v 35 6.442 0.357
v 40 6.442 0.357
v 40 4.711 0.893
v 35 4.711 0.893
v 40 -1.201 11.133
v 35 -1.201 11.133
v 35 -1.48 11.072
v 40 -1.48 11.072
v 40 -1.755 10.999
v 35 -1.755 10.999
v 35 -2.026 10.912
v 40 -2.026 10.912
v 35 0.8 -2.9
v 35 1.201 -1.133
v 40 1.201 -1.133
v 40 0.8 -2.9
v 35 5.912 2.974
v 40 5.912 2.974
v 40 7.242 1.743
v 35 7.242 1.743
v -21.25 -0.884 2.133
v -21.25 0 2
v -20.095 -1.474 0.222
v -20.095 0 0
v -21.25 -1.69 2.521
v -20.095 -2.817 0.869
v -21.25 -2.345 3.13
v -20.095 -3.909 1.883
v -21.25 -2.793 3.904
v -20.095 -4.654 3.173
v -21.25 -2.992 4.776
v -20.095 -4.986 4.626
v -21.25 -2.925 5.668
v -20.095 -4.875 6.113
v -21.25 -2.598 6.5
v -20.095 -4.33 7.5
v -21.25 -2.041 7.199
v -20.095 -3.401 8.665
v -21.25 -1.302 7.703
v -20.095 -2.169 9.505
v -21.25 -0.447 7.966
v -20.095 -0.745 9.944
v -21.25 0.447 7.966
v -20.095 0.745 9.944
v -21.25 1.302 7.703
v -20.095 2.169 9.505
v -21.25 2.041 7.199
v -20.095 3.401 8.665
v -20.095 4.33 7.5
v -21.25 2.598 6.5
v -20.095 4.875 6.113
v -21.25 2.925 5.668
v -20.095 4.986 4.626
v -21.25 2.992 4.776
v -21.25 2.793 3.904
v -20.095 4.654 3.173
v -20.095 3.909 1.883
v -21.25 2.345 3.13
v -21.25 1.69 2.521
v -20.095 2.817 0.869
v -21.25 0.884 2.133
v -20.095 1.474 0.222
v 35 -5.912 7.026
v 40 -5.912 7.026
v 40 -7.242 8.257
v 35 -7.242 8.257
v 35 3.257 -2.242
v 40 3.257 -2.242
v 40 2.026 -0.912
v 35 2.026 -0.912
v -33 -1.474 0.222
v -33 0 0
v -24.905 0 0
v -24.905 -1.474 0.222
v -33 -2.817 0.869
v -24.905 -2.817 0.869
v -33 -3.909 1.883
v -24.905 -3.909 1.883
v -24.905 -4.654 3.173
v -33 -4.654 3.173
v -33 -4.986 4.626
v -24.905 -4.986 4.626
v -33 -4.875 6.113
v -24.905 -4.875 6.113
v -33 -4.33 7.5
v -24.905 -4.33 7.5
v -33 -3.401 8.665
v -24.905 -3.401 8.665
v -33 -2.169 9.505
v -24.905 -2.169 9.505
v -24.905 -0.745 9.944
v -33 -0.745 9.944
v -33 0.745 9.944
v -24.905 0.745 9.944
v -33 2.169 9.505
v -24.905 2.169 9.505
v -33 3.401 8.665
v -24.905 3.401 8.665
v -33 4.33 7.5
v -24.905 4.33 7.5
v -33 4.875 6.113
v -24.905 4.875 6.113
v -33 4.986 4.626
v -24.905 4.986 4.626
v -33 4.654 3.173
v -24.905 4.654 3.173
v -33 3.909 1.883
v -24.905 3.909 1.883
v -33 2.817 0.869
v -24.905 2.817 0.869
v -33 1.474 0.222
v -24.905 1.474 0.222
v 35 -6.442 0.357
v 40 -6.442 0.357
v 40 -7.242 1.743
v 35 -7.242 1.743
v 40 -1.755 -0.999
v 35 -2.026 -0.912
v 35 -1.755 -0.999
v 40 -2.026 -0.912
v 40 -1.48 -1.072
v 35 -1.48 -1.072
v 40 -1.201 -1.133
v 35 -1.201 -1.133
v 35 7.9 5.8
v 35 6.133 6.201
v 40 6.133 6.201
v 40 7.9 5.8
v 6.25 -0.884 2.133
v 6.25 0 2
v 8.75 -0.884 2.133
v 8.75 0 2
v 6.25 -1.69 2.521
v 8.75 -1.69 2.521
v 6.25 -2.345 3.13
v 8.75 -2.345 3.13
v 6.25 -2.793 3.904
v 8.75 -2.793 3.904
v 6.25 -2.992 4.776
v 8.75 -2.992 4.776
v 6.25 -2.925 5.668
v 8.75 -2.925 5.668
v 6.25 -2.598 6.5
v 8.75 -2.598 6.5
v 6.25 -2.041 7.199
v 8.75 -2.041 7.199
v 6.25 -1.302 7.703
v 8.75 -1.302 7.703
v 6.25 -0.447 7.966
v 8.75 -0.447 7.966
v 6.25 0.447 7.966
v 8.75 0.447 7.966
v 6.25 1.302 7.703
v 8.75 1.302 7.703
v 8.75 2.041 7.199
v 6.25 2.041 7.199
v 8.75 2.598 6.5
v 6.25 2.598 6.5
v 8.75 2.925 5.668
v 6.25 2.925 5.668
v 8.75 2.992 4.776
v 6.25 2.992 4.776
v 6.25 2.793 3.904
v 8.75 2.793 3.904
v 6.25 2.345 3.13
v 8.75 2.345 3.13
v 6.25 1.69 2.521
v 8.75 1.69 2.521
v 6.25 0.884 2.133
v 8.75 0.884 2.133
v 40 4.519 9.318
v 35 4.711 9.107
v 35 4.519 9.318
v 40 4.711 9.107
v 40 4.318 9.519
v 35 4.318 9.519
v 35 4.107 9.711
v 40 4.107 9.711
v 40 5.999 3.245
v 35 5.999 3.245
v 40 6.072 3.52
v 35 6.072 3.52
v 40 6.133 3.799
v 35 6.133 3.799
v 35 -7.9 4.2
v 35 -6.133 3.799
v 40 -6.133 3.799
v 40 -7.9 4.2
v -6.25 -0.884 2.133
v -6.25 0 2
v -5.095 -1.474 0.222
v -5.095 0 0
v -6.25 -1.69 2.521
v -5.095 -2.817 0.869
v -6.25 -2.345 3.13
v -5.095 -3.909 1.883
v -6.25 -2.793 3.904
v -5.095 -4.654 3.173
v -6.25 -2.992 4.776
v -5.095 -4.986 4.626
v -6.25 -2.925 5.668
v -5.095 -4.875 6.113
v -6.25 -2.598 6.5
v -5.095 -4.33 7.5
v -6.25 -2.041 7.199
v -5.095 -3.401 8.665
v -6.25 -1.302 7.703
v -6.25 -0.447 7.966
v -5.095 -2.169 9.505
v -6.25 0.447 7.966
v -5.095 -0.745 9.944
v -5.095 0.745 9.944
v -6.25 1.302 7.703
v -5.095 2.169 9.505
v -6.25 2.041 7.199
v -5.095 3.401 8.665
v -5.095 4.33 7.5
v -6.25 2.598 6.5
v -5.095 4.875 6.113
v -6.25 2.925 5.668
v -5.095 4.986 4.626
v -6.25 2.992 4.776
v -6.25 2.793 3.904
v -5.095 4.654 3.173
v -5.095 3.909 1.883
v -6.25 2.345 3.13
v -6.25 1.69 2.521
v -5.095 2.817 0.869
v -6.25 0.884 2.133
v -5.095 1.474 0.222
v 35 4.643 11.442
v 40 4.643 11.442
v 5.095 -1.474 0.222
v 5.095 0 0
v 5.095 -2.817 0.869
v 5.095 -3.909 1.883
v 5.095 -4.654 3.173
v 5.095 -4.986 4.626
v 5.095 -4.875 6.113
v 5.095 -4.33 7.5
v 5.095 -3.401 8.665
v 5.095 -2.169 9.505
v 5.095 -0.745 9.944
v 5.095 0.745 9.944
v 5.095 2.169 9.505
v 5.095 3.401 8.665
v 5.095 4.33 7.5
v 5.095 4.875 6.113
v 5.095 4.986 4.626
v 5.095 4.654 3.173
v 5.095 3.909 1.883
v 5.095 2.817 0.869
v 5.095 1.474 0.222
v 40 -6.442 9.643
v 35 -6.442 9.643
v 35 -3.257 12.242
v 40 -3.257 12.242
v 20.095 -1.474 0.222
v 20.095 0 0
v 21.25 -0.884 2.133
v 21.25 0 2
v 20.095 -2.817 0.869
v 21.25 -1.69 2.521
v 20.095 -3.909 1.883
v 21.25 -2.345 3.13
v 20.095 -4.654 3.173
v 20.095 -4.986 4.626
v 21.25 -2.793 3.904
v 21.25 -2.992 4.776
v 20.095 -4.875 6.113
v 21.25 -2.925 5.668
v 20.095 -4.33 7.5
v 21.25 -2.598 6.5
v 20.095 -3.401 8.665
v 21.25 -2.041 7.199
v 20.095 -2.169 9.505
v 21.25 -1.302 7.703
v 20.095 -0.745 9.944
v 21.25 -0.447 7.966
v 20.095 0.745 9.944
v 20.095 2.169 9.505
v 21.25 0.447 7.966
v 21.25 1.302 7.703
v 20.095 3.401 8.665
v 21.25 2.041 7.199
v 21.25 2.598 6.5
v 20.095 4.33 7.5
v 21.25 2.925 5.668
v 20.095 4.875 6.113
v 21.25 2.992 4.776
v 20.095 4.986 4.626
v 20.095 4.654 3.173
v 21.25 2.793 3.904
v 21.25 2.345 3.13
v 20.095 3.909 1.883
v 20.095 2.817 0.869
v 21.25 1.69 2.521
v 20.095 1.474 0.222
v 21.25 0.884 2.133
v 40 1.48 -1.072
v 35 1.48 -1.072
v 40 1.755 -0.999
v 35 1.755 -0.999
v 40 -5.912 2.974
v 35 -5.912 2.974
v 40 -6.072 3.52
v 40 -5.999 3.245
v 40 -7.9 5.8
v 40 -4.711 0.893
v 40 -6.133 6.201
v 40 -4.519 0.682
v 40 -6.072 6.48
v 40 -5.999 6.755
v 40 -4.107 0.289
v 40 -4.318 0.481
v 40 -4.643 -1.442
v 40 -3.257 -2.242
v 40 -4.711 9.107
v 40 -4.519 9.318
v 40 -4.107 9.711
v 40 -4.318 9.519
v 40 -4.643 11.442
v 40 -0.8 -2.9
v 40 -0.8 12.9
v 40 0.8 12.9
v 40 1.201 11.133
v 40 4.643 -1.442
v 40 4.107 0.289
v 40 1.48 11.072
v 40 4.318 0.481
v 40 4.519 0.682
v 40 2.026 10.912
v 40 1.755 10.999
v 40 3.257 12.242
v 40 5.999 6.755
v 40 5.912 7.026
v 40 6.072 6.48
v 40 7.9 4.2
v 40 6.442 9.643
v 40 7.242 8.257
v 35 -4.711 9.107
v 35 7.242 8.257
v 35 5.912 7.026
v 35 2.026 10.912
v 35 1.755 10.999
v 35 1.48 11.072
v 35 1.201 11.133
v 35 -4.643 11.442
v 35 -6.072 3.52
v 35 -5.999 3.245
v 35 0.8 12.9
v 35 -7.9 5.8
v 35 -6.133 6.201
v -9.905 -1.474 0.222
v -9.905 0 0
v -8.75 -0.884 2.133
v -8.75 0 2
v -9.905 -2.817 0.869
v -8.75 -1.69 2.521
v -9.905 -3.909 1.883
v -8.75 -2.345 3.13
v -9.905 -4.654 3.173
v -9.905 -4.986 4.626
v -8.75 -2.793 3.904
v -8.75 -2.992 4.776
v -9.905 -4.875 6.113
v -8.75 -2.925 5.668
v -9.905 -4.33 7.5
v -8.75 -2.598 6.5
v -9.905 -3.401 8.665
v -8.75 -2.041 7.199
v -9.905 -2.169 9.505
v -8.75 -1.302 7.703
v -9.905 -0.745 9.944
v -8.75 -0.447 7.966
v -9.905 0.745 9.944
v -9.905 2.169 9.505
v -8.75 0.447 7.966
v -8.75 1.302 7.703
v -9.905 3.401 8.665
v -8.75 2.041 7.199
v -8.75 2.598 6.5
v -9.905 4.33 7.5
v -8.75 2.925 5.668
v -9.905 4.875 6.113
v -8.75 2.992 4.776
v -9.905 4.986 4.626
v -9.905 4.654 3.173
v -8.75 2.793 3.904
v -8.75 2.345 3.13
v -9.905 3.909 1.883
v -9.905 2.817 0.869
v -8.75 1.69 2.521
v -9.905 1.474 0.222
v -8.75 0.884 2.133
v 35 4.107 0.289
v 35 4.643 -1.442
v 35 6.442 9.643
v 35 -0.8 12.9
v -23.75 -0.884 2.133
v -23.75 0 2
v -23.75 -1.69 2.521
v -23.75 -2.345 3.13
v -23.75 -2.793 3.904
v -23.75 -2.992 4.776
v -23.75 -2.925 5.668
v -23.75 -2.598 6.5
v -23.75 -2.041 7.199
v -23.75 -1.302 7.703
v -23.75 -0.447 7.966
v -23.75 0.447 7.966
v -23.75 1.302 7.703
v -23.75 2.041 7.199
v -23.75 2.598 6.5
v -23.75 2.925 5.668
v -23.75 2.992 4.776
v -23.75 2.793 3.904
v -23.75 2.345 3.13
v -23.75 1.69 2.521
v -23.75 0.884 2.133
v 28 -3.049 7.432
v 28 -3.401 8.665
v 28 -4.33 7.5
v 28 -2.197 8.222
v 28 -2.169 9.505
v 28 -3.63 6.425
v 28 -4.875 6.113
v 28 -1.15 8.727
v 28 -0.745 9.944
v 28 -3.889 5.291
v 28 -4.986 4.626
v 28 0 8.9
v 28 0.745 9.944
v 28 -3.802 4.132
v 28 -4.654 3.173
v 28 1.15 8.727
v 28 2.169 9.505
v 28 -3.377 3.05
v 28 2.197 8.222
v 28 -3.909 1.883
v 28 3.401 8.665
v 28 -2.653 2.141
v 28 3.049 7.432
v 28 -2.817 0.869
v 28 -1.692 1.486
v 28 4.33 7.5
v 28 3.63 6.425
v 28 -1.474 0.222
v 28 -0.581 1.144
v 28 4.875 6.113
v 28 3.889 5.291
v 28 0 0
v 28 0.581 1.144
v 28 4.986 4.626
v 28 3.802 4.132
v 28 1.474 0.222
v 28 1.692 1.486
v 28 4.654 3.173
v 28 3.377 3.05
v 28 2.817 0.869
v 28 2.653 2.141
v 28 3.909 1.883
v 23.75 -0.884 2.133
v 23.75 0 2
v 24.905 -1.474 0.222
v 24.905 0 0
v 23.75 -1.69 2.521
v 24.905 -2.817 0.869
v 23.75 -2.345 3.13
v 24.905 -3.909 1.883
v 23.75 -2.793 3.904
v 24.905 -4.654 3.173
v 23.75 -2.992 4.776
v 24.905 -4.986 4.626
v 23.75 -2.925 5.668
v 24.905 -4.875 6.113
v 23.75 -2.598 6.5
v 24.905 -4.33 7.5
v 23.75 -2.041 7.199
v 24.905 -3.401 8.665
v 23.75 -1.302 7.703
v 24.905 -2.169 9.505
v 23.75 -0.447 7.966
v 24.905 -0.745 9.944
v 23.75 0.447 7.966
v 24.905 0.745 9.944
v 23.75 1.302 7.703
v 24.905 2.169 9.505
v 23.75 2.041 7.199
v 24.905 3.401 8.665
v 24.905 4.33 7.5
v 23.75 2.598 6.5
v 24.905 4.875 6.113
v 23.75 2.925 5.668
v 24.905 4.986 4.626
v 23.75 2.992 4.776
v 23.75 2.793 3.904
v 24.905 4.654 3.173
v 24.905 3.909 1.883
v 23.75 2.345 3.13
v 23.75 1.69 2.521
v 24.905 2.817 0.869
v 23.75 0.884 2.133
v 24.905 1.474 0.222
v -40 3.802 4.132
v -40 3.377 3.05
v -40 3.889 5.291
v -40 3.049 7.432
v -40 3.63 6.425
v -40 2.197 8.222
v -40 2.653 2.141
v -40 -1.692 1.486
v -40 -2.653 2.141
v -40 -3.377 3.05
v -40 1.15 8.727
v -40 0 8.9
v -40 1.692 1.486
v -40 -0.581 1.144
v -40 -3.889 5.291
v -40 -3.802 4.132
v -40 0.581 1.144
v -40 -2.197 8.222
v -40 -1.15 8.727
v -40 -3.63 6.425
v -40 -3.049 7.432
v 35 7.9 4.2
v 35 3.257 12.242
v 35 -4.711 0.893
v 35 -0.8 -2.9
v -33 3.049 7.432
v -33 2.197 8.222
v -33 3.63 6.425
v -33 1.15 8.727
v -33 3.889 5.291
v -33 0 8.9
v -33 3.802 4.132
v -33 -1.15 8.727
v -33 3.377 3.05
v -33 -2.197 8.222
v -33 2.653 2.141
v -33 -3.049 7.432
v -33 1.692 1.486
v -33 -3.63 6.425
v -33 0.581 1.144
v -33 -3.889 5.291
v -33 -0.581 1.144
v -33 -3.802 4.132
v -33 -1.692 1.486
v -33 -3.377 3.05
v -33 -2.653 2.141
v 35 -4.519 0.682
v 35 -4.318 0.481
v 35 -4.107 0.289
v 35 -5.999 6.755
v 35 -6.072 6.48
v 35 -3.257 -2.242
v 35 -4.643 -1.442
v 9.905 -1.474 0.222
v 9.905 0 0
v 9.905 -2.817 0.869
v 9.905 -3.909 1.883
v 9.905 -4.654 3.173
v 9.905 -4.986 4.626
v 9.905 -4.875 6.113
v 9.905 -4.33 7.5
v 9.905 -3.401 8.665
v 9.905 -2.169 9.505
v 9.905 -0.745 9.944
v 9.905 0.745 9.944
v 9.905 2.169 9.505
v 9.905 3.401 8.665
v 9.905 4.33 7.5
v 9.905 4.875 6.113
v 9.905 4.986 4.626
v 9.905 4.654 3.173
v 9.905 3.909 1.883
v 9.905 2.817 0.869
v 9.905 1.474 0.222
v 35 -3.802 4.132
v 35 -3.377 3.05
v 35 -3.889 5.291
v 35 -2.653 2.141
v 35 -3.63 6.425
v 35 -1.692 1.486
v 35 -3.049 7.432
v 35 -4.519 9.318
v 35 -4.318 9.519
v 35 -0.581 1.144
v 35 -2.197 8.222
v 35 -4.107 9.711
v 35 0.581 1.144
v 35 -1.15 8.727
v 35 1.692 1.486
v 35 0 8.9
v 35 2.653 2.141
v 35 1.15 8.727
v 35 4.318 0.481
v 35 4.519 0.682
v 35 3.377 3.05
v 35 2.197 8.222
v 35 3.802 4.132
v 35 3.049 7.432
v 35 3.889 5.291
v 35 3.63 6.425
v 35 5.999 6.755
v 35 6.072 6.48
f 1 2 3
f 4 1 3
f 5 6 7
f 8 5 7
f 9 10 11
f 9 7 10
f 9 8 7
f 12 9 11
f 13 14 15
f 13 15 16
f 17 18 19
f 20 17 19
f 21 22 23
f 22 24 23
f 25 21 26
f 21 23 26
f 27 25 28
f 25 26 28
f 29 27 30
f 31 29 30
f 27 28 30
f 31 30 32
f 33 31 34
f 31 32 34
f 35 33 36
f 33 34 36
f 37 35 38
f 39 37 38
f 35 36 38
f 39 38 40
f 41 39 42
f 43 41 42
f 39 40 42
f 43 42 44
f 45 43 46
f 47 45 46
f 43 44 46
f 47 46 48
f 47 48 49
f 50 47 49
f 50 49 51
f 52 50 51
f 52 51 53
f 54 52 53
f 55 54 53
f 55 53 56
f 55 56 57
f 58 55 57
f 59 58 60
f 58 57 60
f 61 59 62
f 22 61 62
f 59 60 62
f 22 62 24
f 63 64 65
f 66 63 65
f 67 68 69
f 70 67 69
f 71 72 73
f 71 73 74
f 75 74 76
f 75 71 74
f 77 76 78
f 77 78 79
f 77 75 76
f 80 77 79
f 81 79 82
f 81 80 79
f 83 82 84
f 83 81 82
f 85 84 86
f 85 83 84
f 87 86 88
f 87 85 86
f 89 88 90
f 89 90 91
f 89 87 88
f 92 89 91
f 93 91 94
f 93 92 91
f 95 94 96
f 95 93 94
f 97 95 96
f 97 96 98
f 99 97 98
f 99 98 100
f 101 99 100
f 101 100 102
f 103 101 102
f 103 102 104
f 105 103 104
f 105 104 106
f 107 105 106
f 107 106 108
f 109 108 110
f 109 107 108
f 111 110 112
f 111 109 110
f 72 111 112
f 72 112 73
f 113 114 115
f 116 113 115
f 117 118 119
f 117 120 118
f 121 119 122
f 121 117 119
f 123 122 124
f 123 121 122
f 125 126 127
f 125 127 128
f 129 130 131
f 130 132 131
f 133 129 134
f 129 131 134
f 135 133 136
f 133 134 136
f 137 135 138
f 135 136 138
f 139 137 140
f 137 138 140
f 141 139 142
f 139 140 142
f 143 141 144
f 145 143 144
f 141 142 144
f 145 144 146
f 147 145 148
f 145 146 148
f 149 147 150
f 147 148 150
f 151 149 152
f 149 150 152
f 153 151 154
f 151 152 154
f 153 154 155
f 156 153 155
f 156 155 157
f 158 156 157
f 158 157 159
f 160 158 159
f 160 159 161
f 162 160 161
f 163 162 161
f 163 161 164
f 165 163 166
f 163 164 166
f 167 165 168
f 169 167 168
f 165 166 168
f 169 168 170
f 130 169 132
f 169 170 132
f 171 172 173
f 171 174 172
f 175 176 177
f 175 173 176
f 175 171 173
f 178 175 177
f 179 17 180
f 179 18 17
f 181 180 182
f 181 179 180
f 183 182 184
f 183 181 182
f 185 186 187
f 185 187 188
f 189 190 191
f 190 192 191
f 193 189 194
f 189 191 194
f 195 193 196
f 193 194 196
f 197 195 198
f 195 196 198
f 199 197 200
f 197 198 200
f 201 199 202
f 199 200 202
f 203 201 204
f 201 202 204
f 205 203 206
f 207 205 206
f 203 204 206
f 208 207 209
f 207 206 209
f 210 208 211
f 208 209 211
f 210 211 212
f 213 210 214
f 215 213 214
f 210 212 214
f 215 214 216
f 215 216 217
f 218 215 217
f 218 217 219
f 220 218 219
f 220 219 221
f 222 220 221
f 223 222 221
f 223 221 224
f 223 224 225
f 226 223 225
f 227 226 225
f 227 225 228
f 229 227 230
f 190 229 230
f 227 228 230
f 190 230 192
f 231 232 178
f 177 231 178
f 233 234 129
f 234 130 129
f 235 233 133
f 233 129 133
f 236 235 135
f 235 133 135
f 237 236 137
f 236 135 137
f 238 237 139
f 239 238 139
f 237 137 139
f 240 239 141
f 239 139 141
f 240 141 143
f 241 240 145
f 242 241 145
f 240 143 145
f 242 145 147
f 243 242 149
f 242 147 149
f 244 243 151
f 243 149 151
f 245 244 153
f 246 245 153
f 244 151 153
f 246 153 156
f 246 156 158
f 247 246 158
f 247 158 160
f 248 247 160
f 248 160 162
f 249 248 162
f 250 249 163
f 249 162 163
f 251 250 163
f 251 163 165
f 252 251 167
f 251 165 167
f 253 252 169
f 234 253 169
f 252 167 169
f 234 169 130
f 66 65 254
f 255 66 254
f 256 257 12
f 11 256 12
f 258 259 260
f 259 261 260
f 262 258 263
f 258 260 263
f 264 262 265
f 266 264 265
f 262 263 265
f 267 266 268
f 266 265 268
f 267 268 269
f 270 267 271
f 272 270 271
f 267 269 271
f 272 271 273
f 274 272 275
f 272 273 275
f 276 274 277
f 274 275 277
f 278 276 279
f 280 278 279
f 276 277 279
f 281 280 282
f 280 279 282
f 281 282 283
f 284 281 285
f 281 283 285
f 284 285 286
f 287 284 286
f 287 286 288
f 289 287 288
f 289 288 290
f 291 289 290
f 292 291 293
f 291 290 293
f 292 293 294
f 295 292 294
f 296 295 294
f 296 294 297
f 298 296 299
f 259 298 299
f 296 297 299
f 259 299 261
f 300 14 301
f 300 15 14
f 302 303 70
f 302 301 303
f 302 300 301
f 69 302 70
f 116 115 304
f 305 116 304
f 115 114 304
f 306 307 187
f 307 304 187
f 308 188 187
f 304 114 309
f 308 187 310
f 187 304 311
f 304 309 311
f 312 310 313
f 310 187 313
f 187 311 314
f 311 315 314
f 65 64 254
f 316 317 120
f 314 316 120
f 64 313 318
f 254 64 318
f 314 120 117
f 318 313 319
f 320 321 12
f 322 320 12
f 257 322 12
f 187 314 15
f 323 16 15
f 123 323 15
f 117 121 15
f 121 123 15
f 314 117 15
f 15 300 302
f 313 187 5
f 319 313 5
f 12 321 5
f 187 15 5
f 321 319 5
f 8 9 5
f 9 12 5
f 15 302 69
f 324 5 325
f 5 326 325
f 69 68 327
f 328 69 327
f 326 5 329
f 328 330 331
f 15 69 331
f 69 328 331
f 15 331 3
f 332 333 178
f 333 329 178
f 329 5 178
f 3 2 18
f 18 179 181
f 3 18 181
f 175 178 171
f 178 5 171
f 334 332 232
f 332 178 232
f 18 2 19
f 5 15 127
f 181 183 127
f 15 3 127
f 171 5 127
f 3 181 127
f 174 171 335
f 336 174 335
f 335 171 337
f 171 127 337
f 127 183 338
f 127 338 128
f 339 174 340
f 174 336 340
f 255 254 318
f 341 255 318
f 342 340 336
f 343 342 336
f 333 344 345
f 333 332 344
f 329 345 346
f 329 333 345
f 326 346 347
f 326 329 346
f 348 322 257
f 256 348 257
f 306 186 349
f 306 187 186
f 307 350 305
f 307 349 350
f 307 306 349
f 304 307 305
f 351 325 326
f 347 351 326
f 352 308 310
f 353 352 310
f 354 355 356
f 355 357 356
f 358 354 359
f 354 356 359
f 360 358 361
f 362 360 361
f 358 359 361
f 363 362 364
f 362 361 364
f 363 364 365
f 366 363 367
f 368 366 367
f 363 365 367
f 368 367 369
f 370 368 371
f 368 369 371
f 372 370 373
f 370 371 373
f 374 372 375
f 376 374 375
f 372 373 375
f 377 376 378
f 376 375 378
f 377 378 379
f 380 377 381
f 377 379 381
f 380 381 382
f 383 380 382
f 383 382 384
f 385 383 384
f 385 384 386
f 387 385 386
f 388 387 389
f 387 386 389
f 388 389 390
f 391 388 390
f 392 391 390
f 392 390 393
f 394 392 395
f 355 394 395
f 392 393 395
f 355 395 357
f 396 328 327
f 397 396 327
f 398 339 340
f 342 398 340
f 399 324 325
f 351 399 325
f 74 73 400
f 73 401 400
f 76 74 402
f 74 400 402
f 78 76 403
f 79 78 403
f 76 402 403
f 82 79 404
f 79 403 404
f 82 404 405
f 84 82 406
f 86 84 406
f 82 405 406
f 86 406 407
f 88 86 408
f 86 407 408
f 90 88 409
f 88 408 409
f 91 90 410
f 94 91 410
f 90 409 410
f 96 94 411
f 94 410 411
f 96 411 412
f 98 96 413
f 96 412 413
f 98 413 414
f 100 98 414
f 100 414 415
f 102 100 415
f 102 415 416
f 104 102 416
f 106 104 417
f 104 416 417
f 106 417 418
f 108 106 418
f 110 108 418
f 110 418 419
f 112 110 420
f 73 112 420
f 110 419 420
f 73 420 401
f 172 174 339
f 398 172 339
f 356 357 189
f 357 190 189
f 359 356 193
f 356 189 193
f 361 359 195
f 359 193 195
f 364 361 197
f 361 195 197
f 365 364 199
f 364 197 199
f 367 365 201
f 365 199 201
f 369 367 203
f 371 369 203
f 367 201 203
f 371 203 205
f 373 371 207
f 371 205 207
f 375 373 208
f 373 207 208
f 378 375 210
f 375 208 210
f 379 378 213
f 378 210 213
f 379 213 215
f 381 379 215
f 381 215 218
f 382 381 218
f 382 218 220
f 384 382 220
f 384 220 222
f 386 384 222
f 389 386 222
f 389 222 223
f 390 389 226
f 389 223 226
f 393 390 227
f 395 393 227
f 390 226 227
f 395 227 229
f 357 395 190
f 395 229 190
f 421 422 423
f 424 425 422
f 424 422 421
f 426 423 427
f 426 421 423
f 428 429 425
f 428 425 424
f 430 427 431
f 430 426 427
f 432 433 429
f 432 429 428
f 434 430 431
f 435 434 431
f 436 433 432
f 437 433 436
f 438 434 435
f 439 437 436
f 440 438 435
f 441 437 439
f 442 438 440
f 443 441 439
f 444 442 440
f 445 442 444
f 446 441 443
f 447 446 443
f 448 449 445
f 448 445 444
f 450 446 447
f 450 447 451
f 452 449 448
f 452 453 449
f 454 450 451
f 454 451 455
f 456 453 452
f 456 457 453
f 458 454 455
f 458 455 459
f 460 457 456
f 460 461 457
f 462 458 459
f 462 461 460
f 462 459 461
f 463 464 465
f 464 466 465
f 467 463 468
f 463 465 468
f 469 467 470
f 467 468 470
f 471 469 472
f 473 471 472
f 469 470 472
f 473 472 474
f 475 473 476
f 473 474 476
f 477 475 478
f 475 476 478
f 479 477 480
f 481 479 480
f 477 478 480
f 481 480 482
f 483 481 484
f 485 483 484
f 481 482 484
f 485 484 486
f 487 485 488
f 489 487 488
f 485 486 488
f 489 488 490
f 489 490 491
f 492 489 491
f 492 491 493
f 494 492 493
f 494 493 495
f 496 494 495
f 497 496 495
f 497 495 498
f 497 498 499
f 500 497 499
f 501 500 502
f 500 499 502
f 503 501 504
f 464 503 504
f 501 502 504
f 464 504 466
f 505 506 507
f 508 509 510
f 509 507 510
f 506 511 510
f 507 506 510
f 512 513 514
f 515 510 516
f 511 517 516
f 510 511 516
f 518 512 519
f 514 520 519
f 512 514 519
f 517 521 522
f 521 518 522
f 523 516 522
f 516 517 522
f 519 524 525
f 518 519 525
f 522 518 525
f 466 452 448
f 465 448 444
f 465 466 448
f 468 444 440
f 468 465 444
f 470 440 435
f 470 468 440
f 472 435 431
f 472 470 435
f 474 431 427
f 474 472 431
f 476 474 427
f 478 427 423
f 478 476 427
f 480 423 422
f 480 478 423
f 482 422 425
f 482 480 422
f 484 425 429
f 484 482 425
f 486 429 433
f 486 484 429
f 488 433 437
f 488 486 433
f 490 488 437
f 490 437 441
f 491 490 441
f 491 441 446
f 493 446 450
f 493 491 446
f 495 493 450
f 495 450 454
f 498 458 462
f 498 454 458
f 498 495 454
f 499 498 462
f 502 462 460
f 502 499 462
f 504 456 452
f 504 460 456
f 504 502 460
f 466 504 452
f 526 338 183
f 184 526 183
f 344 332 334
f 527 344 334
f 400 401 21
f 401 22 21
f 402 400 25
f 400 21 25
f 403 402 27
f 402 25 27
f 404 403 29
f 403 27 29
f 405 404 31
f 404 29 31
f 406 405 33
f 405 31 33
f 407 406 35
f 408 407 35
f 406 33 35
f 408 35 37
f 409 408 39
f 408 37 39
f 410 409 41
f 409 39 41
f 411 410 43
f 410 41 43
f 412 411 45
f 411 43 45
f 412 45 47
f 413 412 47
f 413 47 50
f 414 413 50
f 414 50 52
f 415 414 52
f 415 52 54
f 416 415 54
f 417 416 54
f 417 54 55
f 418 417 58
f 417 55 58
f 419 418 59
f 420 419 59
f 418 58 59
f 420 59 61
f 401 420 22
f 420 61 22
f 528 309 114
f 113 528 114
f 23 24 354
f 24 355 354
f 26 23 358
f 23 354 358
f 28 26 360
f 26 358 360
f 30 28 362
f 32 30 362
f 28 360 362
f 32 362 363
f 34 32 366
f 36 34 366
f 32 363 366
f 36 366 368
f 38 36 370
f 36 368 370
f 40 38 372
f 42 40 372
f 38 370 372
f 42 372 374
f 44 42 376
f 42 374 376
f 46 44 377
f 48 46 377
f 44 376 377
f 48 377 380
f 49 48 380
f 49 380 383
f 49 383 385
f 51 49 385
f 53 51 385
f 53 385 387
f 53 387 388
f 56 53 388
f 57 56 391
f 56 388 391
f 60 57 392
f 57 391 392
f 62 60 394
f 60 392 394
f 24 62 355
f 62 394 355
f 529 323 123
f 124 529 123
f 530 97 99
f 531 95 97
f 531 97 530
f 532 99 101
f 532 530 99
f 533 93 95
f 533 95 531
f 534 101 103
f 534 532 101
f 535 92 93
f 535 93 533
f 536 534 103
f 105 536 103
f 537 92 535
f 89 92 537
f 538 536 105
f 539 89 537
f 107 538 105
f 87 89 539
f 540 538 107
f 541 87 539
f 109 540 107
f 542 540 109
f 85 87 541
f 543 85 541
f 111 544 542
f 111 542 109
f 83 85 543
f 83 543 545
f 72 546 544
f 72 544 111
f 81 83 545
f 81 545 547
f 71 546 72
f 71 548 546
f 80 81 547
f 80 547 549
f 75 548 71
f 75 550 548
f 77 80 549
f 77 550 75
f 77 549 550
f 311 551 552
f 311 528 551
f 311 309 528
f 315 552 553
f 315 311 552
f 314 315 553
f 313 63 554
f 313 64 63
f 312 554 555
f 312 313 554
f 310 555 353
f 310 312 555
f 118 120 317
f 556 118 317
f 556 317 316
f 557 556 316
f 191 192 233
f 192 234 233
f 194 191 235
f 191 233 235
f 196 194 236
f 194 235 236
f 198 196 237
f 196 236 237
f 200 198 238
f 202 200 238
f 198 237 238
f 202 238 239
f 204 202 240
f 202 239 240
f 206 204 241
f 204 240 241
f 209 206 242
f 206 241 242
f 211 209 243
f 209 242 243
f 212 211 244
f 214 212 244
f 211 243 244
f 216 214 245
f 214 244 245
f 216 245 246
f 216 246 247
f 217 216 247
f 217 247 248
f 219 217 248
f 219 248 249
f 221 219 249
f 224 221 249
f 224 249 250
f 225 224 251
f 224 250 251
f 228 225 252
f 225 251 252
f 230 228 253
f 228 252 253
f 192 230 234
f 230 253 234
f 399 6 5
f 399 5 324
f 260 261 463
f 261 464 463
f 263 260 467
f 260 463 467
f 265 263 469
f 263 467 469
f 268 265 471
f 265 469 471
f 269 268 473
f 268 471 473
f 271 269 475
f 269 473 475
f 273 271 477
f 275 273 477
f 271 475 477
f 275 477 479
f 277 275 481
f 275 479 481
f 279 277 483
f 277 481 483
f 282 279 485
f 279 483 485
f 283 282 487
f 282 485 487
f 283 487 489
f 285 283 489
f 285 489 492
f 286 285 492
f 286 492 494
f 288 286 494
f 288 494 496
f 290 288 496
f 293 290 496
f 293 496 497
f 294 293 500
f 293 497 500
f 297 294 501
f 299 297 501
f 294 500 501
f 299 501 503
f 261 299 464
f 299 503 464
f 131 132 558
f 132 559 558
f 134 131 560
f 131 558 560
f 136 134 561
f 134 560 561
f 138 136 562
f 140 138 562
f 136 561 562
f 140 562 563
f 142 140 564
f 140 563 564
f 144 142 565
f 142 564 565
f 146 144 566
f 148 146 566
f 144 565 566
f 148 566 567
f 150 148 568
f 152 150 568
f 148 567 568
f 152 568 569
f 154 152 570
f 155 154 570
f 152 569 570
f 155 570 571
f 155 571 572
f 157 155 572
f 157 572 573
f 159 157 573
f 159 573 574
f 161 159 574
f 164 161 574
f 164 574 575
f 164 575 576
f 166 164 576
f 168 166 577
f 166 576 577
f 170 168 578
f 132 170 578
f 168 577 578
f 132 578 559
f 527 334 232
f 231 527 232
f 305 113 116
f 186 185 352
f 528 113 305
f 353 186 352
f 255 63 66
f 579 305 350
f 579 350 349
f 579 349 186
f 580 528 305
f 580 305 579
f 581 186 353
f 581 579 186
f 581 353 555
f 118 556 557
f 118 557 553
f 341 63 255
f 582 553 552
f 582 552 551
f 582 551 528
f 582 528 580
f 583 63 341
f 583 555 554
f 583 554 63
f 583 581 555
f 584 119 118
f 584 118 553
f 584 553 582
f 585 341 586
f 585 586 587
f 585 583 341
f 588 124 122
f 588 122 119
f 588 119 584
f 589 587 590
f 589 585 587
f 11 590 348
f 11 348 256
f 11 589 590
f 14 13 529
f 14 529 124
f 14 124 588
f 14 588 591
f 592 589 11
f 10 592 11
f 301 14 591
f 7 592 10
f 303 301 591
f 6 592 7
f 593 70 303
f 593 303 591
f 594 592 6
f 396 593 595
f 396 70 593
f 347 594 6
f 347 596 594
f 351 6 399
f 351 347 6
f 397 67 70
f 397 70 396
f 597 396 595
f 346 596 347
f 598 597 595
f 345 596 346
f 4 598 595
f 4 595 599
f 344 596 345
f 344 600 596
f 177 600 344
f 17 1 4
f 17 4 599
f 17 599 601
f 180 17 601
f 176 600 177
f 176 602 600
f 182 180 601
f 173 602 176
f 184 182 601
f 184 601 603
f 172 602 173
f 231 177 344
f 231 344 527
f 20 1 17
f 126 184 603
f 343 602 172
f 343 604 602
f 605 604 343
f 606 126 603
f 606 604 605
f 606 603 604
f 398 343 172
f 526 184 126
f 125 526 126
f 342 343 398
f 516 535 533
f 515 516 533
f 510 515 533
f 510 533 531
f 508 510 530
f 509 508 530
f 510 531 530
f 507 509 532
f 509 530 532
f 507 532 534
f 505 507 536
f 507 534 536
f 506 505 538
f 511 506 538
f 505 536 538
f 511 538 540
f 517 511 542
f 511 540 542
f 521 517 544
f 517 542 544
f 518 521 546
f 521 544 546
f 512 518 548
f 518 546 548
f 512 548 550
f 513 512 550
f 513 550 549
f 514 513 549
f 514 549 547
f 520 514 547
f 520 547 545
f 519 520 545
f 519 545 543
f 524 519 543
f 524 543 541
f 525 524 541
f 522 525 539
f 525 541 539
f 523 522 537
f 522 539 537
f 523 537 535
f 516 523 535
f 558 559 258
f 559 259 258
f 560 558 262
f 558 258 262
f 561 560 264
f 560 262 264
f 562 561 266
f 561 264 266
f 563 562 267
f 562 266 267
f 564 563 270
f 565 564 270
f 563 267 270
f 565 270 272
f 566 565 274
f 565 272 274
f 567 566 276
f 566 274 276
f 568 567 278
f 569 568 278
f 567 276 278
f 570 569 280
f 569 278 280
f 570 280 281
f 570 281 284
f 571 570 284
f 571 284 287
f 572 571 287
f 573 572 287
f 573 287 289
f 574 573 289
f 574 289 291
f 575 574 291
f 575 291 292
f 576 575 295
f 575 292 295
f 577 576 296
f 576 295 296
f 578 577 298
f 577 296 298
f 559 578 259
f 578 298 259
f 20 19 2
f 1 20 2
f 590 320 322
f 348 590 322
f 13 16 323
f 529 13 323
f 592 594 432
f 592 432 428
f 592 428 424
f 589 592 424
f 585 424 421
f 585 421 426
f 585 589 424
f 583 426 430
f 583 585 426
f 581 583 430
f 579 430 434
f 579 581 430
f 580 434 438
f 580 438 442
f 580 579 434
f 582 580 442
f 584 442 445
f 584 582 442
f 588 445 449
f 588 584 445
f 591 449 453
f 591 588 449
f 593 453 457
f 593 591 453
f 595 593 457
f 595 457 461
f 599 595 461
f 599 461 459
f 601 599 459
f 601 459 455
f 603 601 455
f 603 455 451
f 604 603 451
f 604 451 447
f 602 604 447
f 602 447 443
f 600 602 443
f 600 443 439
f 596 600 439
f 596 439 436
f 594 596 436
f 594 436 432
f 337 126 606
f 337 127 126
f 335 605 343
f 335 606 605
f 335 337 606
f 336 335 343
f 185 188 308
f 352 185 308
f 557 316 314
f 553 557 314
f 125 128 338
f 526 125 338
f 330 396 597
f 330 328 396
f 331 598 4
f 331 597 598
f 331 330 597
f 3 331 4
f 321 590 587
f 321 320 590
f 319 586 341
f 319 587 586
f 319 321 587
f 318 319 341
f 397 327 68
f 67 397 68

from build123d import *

# Parameters (mm, degrees)
CUT_EXTRUDE2_START  = -7
SKETCH4_R           = 5
SKETCH4_R_2         = 3.9
CUT_EXTRUDE2_DEPTH  = 7
SKETCH3_R           = 5
SKETCH3_R_2         = 3.9
CUT_EXTRUDE4_DEPTH  = 12
SKETCH7_R           = 6.25
BOSS_EXTRUDE1_DEPTH = 5
BOSS_EXTRUDE2_DEPTH = 5
CIRPATTERN1_COUNT   = 12


with BuildPart() as part:
    # Sketch2 → Revolve1 (revolve)
    with BuildSketch(Plane(origin=(0, 0, 0), x_dir=(1, 0, 0), z_dir=(0, 1, 0))):
        Polygon((40, -5), (-40, -5), (-40, 0), (-30.049059985, 0), (-24.904700538, 0), (-23.75, -2), (-21.25, -2), (-20.095299462, 0), (-9.904700538, 0), (-8.75, -2), (-6.25, -2), (-5.095299462, 0), (5.095299462, 0), (6.25, -2), (8.75, -2), (9.904700538, 0), (20.095299462, 0), (21.25, -2), (23.75, -2), (24.904700538, 0), (30.049059985, 0), (40, 0), align=None)
    revolve(axis=Axis((40, 0, 5), (-1, 0, 0)))

    # Sketch4 → Cut-Extrude2 (cut)
    with BuildSketch(Plane.ZY.offset(40).offset(CUT_EXTRUDE2_START)):
        with Locations(Location((5, 0, 0), (0, 0, 180))):
            Circle(SKETCH4_R)
        with Locations((5, 0)):
            Circle(SKETCH4_R_2, mode=Mode.SUBTRACT)
    extrude(amount=CUT_EXTRUDE2_DEPTH, mode=Mode.SUBTRACT)

    # Sketch3 → Cut-Extrude4 (cut)
    with BuildSketch(Plane(origin=(40, 0, 0), x_dir=(0, 0, -1), z_dir=(1, 0, 0))):
        with Locations((-5, 0)):
            Circle(SKETCH3_R)
        with Locations(Location((-5, 0, 0), (0, 0, 180))):
            Circle(SKETCH3_R_2, mode=Mode.SUBTRACT)
    extrude(amount=-CUT_EXTRUDE4_DEPTH, mode=Mode.SUBTRACT)

    # Sketch7 → Boss-Extrude1 (add)
    with BuildSketch(Plane(origin=(40, 0, 0), x_dir=(0, 0, -1), z_dir=(1, 0, 0))):
        with Locations((-5, 0)):
            Circle(SKETCH7_R)
    extrude(amount=-BOSS_EXTRUDE1_DEPTH)

    # Sketch6 → Boss-Extrude2 (add)
    with BuildSketch(Plane(origin=(40, 0, 0), x_dir=(0, 0, -1), z_dir=(1, 0, 0))):
        Polygon((-5.8, 7.9), (-4.2, 7.9), (-3.7, 5.7), (-6.3, 5.7), align=None)
    boss_extrude2 = extrude(amount=-BOSS_EXTRUDE2_DEPTH)

    # CirPattern1: Boss-Extrude2 ×12 about axis
    cirpattern1_axis = Axis((0, 0, 5), (1, 0, 0))
    for i in range(1, CIRPATTERN1_COUNT):
        add(boss_extrude2.rotate(cirpattern1_axis, i * 360 / CIRPATTERN1_COUNT))


solid = part.part
